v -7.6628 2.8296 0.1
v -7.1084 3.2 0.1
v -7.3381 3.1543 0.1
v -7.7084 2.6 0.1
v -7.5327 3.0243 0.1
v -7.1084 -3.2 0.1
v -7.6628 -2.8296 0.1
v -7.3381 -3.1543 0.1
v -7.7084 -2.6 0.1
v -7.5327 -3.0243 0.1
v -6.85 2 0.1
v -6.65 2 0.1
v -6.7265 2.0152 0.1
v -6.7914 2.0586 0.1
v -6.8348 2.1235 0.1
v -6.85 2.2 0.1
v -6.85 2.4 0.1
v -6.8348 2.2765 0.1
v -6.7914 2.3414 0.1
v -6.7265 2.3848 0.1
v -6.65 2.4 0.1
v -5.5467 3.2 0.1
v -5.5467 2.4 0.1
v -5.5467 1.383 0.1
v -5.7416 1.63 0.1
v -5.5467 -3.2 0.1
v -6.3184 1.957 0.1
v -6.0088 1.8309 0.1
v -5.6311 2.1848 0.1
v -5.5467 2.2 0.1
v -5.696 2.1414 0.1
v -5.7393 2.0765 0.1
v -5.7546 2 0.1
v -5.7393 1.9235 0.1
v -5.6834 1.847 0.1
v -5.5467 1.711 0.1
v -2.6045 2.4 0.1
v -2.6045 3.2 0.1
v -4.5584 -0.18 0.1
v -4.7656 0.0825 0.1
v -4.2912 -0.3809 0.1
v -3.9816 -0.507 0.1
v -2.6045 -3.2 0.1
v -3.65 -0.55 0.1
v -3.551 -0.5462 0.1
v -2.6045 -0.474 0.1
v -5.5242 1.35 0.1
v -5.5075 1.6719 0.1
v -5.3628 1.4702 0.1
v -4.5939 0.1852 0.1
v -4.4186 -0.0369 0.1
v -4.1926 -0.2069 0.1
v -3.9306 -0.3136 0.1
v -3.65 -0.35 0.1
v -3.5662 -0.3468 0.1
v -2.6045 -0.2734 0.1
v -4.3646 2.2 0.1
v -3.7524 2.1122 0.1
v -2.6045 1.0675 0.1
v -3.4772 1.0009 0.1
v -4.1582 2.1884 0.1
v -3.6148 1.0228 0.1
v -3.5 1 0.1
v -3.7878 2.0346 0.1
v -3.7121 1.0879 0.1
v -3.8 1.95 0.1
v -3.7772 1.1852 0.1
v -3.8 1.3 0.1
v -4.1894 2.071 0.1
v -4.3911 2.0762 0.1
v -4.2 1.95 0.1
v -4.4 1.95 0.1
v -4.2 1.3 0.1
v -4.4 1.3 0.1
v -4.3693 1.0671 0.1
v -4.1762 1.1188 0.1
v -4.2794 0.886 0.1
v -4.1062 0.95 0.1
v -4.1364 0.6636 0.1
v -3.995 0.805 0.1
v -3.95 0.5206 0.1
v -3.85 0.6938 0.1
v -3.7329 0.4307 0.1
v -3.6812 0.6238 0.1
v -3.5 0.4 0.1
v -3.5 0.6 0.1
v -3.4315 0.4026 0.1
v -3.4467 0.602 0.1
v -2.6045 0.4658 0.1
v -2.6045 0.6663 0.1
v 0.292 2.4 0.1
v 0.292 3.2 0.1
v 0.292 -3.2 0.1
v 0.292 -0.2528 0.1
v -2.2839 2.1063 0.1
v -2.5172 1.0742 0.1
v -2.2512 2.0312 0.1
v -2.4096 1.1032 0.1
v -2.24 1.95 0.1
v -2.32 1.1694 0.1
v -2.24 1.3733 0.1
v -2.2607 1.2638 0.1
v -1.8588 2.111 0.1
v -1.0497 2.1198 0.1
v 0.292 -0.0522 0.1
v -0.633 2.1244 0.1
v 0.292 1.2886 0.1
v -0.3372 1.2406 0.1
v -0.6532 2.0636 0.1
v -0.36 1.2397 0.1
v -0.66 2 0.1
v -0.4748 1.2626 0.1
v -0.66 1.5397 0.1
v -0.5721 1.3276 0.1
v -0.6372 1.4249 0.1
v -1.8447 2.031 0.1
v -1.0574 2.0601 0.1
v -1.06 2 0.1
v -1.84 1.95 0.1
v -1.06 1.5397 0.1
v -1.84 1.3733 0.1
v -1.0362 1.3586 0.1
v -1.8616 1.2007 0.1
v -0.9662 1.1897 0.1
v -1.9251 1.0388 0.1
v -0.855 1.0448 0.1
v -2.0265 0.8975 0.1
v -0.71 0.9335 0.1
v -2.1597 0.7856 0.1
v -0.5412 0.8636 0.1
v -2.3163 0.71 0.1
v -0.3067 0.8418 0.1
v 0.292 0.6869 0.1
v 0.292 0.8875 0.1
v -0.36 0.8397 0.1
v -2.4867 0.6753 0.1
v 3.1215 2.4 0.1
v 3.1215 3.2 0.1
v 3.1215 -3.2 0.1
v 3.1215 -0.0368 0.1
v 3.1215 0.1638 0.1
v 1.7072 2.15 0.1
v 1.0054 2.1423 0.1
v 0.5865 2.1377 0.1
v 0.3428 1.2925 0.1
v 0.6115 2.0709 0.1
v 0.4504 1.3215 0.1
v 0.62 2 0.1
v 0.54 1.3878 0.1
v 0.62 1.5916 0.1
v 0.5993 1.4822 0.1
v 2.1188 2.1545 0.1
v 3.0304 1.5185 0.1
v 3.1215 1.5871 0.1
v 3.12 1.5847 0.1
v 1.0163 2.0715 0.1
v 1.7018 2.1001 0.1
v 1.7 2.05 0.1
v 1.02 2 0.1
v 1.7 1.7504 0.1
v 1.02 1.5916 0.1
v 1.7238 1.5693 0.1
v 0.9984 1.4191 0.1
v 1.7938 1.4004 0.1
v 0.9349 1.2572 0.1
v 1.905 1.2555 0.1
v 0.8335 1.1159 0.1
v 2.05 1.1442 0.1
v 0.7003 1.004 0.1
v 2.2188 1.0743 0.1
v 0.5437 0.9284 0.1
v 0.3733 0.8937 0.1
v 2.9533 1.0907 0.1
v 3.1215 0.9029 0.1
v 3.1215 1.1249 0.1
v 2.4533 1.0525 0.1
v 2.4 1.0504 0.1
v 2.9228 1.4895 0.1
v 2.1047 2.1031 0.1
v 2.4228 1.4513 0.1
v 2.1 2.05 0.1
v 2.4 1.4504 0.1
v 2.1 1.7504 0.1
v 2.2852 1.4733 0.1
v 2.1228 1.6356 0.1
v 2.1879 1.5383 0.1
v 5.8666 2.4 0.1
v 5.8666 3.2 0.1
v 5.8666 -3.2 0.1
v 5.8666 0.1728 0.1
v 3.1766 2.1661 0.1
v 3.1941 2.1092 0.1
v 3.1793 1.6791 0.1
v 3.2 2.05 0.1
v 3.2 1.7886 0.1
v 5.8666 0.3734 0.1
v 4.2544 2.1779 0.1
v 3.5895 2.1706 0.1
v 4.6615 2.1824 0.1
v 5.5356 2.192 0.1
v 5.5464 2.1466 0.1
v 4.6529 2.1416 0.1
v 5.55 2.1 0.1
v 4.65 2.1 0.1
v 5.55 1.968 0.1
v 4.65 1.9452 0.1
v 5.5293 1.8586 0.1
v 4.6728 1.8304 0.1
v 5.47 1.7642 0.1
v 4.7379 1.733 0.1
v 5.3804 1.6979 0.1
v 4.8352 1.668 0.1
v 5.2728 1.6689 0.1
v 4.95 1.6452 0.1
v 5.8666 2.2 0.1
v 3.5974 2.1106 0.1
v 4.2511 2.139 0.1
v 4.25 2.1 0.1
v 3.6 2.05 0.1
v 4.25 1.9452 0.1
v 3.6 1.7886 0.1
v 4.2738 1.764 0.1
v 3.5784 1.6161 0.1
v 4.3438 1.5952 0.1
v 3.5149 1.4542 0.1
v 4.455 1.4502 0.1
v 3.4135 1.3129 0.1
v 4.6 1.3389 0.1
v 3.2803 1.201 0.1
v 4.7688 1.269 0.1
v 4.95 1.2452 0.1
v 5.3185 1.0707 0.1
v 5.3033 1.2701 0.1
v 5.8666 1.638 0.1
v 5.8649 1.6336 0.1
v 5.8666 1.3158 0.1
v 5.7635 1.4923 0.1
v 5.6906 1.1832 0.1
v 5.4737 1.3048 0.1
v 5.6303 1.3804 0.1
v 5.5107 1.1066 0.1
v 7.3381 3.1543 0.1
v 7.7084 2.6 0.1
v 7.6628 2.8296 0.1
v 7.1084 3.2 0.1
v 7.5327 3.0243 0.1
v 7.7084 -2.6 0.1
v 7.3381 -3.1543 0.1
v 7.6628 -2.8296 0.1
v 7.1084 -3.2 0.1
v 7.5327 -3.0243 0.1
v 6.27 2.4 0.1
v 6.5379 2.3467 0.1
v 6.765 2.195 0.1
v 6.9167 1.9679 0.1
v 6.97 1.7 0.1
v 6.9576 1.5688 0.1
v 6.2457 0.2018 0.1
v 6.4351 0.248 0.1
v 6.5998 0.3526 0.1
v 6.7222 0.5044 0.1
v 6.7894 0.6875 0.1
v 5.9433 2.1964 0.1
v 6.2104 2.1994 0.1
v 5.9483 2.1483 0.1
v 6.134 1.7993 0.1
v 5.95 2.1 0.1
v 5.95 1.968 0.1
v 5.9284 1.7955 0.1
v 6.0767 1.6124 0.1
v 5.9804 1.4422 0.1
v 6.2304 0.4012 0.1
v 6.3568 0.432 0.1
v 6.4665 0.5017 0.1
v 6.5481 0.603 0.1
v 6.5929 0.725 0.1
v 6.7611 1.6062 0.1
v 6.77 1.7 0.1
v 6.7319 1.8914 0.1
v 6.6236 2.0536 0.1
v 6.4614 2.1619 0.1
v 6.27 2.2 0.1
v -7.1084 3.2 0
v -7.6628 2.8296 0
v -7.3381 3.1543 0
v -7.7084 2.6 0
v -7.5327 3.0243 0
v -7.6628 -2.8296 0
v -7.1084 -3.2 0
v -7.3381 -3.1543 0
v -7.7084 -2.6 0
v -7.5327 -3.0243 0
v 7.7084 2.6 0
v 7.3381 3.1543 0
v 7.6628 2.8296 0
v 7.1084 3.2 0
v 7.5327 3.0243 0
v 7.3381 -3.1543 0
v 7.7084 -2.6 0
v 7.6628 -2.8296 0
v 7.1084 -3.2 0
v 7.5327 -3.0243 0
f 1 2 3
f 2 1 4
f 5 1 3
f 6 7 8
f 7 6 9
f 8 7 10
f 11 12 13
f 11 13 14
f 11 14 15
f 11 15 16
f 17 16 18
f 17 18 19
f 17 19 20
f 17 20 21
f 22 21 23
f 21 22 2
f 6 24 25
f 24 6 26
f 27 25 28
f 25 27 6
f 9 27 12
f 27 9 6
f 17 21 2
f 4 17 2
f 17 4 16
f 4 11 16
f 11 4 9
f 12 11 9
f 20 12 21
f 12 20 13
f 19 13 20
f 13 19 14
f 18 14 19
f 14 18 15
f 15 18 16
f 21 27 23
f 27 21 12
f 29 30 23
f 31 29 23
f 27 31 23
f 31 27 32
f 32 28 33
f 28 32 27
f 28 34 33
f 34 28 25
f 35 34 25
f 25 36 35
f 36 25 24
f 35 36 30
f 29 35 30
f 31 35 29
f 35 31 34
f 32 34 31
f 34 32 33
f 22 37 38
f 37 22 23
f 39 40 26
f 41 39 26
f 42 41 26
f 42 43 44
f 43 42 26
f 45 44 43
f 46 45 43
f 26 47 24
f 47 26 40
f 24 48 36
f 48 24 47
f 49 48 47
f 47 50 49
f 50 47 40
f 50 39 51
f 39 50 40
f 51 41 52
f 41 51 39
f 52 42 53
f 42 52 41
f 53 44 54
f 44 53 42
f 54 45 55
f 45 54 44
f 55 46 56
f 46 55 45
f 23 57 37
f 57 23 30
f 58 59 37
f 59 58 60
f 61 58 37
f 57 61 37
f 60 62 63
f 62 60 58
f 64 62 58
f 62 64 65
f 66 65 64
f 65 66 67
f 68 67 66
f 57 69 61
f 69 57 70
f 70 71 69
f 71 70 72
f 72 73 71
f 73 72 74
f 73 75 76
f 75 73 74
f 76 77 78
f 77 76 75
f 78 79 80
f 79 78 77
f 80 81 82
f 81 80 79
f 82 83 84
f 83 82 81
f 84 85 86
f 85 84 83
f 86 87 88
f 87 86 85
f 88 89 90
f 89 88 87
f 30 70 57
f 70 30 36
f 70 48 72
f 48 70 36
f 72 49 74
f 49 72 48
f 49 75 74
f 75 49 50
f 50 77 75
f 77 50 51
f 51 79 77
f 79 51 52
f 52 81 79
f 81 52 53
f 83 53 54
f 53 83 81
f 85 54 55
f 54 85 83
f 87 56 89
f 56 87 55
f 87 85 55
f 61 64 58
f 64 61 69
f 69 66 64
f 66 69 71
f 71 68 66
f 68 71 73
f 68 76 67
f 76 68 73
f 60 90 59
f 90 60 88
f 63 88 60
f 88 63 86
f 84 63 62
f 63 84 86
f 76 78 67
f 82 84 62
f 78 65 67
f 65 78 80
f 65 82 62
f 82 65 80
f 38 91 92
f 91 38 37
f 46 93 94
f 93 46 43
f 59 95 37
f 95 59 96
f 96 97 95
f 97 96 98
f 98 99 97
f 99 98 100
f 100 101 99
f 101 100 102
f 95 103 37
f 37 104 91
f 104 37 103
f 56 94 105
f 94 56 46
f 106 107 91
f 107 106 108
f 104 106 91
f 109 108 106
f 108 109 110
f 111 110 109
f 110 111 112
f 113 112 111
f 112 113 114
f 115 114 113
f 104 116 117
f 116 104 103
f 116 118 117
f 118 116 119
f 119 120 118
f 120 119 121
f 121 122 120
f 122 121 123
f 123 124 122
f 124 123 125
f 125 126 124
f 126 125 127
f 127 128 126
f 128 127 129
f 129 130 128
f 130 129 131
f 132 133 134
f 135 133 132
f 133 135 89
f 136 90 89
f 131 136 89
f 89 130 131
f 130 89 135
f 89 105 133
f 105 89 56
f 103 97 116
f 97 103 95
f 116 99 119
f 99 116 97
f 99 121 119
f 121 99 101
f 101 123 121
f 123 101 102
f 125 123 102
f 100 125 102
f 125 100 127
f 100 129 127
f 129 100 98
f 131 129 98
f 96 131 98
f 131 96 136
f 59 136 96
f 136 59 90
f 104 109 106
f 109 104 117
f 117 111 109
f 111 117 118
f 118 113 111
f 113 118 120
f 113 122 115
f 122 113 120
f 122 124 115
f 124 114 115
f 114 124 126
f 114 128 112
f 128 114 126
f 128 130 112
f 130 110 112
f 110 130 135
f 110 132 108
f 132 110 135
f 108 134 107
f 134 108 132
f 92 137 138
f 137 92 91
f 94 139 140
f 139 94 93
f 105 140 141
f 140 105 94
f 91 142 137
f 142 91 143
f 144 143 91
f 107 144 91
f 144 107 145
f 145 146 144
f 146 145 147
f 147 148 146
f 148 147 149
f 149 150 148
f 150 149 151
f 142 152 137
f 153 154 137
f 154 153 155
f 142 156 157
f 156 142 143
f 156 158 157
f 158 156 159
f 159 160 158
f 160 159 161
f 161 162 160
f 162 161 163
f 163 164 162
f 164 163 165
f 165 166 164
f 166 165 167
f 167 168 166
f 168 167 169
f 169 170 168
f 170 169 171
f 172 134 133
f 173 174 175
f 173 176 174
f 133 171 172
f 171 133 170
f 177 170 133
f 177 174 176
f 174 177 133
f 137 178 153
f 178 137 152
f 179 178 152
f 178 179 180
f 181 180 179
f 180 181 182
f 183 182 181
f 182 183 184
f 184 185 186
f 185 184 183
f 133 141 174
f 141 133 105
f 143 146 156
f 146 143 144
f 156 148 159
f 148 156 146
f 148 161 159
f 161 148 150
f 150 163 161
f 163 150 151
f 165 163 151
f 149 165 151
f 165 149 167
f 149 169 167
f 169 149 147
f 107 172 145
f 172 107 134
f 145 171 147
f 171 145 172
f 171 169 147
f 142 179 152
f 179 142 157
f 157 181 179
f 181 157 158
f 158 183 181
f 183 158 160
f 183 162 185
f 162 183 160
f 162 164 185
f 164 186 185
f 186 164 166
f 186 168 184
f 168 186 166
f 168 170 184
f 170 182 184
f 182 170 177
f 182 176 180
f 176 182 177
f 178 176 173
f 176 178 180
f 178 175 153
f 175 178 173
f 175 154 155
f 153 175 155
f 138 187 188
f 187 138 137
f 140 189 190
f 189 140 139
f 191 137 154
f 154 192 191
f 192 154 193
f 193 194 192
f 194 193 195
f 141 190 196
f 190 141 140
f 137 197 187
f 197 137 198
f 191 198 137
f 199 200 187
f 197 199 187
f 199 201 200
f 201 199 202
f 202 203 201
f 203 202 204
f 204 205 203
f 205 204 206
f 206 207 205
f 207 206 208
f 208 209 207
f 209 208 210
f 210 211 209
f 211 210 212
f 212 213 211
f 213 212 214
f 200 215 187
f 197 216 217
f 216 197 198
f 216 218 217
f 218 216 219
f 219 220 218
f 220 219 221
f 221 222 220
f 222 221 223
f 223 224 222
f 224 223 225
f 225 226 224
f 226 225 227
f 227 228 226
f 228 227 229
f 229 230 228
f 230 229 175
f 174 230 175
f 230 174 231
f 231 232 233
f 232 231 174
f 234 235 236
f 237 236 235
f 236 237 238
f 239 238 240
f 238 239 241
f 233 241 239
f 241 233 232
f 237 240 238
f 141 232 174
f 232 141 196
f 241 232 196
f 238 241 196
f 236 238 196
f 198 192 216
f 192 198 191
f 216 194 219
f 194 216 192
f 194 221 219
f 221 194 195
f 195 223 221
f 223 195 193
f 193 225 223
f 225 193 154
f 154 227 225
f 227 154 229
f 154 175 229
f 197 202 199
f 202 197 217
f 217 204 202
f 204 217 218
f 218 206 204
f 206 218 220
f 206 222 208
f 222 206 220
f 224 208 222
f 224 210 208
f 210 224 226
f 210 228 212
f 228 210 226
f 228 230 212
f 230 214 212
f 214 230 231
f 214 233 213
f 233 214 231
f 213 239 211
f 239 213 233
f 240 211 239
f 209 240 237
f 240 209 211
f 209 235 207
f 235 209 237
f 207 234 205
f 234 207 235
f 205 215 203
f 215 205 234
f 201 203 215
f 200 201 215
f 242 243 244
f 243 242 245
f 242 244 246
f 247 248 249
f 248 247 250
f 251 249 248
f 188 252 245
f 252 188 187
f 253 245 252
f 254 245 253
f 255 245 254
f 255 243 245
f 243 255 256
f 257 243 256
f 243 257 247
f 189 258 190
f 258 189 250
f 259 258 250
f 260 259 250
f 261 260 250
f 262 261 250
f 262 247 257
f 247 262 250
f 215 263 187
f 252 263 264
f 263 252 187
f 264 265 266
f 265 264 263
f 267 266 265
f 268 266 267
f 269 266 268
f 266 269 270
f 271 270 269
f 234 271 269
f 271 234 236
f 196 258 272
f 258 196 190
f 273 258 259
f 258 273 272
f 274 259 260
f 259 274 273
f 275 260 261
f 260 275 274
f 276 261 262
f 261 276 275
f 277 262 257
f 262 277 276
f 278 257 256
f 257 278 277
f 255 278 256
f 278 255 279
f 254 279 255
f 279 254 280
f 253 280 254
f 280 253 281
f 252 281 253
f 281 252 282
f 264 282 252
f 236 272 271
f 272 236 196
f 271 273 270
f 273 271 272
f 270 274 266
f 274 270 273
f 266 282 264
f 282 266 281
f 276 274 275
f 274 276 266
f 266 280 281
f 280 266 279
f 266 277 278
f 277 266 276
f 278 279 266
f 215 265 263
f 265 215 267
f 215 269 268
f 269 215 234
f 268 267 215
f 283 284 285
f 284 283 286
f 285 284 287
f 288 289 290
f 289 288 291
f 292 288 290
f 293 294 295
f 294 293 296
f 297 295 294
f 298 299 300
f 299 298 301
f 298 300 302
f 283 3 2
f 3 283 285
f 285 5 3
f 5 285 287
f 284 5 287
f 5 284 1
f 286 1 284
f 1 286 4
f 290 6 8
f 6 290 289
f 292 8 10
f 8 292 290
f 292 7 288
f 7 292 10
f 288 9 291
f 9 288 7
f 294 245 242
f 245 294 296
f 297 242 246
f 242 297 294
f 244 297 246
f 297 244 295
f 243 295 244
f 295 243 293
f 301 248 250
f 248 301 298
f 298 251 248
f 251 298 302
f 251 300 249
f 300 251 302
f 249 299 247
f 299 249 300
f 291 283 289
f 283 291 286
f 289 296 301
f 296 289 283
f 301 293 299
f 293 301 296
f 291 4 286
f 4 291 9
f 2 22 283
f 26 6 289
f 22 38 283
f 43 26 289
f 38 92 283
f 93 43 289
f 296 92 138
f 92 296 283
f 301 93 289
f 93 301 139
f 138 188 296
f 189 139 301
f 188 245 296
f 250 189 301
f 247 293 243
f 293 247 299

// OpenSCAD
use <../lib.scad>
use <6177949f.scad>
$fa=1; $fs=0.2;
function ldraw_lib__6177949g(realsolid=false) = [
// 0 Sticker  0.8 x  1.9 with Black and Dark Blue Headlamp on Transparent Background Left
// 0 Name: 6177949g.dat
// 0 Author: Massimo Maso [Sirio]
// 0 !LDRAW_ORG Part UPDATE 2022-04
// 0 !LICENSE Licensed under CC BY 2.0 and CC BY 4.0 : see CAreadme.txt
// 
// 0 BFC CERTIFY CCW
  [0,"BFC","CERTIFY"],
  [0,"BFC","CCW"],
// 
// 0 !KEYWORDS Bugatti, Chiron, Set 75878, Speed Champions
// 
// 0 !HISTORY 2022-07-18 [PTadmin] Official Update 2022-04
// 
// 
// 1 16 0 0 0 -1 0 0 0 1 0 0 0 1 6177949f.dat
  [1,16,0,0,0,-1,0,0,0,1,0,0,0,1, ldraw_lib__6177949f(realsolid)],
];
module ldraw_lib__6177949g(step=0, col=false, unit=2/5, alt=false, line=0.2, solid=!$preview)
    makepoly(ldraw_lib__6177949g(solid), step=step, col=col, unit=unit, alt=alt, line=line, solid=solid);
ldraw_lib__6177949g(line=0.2);
